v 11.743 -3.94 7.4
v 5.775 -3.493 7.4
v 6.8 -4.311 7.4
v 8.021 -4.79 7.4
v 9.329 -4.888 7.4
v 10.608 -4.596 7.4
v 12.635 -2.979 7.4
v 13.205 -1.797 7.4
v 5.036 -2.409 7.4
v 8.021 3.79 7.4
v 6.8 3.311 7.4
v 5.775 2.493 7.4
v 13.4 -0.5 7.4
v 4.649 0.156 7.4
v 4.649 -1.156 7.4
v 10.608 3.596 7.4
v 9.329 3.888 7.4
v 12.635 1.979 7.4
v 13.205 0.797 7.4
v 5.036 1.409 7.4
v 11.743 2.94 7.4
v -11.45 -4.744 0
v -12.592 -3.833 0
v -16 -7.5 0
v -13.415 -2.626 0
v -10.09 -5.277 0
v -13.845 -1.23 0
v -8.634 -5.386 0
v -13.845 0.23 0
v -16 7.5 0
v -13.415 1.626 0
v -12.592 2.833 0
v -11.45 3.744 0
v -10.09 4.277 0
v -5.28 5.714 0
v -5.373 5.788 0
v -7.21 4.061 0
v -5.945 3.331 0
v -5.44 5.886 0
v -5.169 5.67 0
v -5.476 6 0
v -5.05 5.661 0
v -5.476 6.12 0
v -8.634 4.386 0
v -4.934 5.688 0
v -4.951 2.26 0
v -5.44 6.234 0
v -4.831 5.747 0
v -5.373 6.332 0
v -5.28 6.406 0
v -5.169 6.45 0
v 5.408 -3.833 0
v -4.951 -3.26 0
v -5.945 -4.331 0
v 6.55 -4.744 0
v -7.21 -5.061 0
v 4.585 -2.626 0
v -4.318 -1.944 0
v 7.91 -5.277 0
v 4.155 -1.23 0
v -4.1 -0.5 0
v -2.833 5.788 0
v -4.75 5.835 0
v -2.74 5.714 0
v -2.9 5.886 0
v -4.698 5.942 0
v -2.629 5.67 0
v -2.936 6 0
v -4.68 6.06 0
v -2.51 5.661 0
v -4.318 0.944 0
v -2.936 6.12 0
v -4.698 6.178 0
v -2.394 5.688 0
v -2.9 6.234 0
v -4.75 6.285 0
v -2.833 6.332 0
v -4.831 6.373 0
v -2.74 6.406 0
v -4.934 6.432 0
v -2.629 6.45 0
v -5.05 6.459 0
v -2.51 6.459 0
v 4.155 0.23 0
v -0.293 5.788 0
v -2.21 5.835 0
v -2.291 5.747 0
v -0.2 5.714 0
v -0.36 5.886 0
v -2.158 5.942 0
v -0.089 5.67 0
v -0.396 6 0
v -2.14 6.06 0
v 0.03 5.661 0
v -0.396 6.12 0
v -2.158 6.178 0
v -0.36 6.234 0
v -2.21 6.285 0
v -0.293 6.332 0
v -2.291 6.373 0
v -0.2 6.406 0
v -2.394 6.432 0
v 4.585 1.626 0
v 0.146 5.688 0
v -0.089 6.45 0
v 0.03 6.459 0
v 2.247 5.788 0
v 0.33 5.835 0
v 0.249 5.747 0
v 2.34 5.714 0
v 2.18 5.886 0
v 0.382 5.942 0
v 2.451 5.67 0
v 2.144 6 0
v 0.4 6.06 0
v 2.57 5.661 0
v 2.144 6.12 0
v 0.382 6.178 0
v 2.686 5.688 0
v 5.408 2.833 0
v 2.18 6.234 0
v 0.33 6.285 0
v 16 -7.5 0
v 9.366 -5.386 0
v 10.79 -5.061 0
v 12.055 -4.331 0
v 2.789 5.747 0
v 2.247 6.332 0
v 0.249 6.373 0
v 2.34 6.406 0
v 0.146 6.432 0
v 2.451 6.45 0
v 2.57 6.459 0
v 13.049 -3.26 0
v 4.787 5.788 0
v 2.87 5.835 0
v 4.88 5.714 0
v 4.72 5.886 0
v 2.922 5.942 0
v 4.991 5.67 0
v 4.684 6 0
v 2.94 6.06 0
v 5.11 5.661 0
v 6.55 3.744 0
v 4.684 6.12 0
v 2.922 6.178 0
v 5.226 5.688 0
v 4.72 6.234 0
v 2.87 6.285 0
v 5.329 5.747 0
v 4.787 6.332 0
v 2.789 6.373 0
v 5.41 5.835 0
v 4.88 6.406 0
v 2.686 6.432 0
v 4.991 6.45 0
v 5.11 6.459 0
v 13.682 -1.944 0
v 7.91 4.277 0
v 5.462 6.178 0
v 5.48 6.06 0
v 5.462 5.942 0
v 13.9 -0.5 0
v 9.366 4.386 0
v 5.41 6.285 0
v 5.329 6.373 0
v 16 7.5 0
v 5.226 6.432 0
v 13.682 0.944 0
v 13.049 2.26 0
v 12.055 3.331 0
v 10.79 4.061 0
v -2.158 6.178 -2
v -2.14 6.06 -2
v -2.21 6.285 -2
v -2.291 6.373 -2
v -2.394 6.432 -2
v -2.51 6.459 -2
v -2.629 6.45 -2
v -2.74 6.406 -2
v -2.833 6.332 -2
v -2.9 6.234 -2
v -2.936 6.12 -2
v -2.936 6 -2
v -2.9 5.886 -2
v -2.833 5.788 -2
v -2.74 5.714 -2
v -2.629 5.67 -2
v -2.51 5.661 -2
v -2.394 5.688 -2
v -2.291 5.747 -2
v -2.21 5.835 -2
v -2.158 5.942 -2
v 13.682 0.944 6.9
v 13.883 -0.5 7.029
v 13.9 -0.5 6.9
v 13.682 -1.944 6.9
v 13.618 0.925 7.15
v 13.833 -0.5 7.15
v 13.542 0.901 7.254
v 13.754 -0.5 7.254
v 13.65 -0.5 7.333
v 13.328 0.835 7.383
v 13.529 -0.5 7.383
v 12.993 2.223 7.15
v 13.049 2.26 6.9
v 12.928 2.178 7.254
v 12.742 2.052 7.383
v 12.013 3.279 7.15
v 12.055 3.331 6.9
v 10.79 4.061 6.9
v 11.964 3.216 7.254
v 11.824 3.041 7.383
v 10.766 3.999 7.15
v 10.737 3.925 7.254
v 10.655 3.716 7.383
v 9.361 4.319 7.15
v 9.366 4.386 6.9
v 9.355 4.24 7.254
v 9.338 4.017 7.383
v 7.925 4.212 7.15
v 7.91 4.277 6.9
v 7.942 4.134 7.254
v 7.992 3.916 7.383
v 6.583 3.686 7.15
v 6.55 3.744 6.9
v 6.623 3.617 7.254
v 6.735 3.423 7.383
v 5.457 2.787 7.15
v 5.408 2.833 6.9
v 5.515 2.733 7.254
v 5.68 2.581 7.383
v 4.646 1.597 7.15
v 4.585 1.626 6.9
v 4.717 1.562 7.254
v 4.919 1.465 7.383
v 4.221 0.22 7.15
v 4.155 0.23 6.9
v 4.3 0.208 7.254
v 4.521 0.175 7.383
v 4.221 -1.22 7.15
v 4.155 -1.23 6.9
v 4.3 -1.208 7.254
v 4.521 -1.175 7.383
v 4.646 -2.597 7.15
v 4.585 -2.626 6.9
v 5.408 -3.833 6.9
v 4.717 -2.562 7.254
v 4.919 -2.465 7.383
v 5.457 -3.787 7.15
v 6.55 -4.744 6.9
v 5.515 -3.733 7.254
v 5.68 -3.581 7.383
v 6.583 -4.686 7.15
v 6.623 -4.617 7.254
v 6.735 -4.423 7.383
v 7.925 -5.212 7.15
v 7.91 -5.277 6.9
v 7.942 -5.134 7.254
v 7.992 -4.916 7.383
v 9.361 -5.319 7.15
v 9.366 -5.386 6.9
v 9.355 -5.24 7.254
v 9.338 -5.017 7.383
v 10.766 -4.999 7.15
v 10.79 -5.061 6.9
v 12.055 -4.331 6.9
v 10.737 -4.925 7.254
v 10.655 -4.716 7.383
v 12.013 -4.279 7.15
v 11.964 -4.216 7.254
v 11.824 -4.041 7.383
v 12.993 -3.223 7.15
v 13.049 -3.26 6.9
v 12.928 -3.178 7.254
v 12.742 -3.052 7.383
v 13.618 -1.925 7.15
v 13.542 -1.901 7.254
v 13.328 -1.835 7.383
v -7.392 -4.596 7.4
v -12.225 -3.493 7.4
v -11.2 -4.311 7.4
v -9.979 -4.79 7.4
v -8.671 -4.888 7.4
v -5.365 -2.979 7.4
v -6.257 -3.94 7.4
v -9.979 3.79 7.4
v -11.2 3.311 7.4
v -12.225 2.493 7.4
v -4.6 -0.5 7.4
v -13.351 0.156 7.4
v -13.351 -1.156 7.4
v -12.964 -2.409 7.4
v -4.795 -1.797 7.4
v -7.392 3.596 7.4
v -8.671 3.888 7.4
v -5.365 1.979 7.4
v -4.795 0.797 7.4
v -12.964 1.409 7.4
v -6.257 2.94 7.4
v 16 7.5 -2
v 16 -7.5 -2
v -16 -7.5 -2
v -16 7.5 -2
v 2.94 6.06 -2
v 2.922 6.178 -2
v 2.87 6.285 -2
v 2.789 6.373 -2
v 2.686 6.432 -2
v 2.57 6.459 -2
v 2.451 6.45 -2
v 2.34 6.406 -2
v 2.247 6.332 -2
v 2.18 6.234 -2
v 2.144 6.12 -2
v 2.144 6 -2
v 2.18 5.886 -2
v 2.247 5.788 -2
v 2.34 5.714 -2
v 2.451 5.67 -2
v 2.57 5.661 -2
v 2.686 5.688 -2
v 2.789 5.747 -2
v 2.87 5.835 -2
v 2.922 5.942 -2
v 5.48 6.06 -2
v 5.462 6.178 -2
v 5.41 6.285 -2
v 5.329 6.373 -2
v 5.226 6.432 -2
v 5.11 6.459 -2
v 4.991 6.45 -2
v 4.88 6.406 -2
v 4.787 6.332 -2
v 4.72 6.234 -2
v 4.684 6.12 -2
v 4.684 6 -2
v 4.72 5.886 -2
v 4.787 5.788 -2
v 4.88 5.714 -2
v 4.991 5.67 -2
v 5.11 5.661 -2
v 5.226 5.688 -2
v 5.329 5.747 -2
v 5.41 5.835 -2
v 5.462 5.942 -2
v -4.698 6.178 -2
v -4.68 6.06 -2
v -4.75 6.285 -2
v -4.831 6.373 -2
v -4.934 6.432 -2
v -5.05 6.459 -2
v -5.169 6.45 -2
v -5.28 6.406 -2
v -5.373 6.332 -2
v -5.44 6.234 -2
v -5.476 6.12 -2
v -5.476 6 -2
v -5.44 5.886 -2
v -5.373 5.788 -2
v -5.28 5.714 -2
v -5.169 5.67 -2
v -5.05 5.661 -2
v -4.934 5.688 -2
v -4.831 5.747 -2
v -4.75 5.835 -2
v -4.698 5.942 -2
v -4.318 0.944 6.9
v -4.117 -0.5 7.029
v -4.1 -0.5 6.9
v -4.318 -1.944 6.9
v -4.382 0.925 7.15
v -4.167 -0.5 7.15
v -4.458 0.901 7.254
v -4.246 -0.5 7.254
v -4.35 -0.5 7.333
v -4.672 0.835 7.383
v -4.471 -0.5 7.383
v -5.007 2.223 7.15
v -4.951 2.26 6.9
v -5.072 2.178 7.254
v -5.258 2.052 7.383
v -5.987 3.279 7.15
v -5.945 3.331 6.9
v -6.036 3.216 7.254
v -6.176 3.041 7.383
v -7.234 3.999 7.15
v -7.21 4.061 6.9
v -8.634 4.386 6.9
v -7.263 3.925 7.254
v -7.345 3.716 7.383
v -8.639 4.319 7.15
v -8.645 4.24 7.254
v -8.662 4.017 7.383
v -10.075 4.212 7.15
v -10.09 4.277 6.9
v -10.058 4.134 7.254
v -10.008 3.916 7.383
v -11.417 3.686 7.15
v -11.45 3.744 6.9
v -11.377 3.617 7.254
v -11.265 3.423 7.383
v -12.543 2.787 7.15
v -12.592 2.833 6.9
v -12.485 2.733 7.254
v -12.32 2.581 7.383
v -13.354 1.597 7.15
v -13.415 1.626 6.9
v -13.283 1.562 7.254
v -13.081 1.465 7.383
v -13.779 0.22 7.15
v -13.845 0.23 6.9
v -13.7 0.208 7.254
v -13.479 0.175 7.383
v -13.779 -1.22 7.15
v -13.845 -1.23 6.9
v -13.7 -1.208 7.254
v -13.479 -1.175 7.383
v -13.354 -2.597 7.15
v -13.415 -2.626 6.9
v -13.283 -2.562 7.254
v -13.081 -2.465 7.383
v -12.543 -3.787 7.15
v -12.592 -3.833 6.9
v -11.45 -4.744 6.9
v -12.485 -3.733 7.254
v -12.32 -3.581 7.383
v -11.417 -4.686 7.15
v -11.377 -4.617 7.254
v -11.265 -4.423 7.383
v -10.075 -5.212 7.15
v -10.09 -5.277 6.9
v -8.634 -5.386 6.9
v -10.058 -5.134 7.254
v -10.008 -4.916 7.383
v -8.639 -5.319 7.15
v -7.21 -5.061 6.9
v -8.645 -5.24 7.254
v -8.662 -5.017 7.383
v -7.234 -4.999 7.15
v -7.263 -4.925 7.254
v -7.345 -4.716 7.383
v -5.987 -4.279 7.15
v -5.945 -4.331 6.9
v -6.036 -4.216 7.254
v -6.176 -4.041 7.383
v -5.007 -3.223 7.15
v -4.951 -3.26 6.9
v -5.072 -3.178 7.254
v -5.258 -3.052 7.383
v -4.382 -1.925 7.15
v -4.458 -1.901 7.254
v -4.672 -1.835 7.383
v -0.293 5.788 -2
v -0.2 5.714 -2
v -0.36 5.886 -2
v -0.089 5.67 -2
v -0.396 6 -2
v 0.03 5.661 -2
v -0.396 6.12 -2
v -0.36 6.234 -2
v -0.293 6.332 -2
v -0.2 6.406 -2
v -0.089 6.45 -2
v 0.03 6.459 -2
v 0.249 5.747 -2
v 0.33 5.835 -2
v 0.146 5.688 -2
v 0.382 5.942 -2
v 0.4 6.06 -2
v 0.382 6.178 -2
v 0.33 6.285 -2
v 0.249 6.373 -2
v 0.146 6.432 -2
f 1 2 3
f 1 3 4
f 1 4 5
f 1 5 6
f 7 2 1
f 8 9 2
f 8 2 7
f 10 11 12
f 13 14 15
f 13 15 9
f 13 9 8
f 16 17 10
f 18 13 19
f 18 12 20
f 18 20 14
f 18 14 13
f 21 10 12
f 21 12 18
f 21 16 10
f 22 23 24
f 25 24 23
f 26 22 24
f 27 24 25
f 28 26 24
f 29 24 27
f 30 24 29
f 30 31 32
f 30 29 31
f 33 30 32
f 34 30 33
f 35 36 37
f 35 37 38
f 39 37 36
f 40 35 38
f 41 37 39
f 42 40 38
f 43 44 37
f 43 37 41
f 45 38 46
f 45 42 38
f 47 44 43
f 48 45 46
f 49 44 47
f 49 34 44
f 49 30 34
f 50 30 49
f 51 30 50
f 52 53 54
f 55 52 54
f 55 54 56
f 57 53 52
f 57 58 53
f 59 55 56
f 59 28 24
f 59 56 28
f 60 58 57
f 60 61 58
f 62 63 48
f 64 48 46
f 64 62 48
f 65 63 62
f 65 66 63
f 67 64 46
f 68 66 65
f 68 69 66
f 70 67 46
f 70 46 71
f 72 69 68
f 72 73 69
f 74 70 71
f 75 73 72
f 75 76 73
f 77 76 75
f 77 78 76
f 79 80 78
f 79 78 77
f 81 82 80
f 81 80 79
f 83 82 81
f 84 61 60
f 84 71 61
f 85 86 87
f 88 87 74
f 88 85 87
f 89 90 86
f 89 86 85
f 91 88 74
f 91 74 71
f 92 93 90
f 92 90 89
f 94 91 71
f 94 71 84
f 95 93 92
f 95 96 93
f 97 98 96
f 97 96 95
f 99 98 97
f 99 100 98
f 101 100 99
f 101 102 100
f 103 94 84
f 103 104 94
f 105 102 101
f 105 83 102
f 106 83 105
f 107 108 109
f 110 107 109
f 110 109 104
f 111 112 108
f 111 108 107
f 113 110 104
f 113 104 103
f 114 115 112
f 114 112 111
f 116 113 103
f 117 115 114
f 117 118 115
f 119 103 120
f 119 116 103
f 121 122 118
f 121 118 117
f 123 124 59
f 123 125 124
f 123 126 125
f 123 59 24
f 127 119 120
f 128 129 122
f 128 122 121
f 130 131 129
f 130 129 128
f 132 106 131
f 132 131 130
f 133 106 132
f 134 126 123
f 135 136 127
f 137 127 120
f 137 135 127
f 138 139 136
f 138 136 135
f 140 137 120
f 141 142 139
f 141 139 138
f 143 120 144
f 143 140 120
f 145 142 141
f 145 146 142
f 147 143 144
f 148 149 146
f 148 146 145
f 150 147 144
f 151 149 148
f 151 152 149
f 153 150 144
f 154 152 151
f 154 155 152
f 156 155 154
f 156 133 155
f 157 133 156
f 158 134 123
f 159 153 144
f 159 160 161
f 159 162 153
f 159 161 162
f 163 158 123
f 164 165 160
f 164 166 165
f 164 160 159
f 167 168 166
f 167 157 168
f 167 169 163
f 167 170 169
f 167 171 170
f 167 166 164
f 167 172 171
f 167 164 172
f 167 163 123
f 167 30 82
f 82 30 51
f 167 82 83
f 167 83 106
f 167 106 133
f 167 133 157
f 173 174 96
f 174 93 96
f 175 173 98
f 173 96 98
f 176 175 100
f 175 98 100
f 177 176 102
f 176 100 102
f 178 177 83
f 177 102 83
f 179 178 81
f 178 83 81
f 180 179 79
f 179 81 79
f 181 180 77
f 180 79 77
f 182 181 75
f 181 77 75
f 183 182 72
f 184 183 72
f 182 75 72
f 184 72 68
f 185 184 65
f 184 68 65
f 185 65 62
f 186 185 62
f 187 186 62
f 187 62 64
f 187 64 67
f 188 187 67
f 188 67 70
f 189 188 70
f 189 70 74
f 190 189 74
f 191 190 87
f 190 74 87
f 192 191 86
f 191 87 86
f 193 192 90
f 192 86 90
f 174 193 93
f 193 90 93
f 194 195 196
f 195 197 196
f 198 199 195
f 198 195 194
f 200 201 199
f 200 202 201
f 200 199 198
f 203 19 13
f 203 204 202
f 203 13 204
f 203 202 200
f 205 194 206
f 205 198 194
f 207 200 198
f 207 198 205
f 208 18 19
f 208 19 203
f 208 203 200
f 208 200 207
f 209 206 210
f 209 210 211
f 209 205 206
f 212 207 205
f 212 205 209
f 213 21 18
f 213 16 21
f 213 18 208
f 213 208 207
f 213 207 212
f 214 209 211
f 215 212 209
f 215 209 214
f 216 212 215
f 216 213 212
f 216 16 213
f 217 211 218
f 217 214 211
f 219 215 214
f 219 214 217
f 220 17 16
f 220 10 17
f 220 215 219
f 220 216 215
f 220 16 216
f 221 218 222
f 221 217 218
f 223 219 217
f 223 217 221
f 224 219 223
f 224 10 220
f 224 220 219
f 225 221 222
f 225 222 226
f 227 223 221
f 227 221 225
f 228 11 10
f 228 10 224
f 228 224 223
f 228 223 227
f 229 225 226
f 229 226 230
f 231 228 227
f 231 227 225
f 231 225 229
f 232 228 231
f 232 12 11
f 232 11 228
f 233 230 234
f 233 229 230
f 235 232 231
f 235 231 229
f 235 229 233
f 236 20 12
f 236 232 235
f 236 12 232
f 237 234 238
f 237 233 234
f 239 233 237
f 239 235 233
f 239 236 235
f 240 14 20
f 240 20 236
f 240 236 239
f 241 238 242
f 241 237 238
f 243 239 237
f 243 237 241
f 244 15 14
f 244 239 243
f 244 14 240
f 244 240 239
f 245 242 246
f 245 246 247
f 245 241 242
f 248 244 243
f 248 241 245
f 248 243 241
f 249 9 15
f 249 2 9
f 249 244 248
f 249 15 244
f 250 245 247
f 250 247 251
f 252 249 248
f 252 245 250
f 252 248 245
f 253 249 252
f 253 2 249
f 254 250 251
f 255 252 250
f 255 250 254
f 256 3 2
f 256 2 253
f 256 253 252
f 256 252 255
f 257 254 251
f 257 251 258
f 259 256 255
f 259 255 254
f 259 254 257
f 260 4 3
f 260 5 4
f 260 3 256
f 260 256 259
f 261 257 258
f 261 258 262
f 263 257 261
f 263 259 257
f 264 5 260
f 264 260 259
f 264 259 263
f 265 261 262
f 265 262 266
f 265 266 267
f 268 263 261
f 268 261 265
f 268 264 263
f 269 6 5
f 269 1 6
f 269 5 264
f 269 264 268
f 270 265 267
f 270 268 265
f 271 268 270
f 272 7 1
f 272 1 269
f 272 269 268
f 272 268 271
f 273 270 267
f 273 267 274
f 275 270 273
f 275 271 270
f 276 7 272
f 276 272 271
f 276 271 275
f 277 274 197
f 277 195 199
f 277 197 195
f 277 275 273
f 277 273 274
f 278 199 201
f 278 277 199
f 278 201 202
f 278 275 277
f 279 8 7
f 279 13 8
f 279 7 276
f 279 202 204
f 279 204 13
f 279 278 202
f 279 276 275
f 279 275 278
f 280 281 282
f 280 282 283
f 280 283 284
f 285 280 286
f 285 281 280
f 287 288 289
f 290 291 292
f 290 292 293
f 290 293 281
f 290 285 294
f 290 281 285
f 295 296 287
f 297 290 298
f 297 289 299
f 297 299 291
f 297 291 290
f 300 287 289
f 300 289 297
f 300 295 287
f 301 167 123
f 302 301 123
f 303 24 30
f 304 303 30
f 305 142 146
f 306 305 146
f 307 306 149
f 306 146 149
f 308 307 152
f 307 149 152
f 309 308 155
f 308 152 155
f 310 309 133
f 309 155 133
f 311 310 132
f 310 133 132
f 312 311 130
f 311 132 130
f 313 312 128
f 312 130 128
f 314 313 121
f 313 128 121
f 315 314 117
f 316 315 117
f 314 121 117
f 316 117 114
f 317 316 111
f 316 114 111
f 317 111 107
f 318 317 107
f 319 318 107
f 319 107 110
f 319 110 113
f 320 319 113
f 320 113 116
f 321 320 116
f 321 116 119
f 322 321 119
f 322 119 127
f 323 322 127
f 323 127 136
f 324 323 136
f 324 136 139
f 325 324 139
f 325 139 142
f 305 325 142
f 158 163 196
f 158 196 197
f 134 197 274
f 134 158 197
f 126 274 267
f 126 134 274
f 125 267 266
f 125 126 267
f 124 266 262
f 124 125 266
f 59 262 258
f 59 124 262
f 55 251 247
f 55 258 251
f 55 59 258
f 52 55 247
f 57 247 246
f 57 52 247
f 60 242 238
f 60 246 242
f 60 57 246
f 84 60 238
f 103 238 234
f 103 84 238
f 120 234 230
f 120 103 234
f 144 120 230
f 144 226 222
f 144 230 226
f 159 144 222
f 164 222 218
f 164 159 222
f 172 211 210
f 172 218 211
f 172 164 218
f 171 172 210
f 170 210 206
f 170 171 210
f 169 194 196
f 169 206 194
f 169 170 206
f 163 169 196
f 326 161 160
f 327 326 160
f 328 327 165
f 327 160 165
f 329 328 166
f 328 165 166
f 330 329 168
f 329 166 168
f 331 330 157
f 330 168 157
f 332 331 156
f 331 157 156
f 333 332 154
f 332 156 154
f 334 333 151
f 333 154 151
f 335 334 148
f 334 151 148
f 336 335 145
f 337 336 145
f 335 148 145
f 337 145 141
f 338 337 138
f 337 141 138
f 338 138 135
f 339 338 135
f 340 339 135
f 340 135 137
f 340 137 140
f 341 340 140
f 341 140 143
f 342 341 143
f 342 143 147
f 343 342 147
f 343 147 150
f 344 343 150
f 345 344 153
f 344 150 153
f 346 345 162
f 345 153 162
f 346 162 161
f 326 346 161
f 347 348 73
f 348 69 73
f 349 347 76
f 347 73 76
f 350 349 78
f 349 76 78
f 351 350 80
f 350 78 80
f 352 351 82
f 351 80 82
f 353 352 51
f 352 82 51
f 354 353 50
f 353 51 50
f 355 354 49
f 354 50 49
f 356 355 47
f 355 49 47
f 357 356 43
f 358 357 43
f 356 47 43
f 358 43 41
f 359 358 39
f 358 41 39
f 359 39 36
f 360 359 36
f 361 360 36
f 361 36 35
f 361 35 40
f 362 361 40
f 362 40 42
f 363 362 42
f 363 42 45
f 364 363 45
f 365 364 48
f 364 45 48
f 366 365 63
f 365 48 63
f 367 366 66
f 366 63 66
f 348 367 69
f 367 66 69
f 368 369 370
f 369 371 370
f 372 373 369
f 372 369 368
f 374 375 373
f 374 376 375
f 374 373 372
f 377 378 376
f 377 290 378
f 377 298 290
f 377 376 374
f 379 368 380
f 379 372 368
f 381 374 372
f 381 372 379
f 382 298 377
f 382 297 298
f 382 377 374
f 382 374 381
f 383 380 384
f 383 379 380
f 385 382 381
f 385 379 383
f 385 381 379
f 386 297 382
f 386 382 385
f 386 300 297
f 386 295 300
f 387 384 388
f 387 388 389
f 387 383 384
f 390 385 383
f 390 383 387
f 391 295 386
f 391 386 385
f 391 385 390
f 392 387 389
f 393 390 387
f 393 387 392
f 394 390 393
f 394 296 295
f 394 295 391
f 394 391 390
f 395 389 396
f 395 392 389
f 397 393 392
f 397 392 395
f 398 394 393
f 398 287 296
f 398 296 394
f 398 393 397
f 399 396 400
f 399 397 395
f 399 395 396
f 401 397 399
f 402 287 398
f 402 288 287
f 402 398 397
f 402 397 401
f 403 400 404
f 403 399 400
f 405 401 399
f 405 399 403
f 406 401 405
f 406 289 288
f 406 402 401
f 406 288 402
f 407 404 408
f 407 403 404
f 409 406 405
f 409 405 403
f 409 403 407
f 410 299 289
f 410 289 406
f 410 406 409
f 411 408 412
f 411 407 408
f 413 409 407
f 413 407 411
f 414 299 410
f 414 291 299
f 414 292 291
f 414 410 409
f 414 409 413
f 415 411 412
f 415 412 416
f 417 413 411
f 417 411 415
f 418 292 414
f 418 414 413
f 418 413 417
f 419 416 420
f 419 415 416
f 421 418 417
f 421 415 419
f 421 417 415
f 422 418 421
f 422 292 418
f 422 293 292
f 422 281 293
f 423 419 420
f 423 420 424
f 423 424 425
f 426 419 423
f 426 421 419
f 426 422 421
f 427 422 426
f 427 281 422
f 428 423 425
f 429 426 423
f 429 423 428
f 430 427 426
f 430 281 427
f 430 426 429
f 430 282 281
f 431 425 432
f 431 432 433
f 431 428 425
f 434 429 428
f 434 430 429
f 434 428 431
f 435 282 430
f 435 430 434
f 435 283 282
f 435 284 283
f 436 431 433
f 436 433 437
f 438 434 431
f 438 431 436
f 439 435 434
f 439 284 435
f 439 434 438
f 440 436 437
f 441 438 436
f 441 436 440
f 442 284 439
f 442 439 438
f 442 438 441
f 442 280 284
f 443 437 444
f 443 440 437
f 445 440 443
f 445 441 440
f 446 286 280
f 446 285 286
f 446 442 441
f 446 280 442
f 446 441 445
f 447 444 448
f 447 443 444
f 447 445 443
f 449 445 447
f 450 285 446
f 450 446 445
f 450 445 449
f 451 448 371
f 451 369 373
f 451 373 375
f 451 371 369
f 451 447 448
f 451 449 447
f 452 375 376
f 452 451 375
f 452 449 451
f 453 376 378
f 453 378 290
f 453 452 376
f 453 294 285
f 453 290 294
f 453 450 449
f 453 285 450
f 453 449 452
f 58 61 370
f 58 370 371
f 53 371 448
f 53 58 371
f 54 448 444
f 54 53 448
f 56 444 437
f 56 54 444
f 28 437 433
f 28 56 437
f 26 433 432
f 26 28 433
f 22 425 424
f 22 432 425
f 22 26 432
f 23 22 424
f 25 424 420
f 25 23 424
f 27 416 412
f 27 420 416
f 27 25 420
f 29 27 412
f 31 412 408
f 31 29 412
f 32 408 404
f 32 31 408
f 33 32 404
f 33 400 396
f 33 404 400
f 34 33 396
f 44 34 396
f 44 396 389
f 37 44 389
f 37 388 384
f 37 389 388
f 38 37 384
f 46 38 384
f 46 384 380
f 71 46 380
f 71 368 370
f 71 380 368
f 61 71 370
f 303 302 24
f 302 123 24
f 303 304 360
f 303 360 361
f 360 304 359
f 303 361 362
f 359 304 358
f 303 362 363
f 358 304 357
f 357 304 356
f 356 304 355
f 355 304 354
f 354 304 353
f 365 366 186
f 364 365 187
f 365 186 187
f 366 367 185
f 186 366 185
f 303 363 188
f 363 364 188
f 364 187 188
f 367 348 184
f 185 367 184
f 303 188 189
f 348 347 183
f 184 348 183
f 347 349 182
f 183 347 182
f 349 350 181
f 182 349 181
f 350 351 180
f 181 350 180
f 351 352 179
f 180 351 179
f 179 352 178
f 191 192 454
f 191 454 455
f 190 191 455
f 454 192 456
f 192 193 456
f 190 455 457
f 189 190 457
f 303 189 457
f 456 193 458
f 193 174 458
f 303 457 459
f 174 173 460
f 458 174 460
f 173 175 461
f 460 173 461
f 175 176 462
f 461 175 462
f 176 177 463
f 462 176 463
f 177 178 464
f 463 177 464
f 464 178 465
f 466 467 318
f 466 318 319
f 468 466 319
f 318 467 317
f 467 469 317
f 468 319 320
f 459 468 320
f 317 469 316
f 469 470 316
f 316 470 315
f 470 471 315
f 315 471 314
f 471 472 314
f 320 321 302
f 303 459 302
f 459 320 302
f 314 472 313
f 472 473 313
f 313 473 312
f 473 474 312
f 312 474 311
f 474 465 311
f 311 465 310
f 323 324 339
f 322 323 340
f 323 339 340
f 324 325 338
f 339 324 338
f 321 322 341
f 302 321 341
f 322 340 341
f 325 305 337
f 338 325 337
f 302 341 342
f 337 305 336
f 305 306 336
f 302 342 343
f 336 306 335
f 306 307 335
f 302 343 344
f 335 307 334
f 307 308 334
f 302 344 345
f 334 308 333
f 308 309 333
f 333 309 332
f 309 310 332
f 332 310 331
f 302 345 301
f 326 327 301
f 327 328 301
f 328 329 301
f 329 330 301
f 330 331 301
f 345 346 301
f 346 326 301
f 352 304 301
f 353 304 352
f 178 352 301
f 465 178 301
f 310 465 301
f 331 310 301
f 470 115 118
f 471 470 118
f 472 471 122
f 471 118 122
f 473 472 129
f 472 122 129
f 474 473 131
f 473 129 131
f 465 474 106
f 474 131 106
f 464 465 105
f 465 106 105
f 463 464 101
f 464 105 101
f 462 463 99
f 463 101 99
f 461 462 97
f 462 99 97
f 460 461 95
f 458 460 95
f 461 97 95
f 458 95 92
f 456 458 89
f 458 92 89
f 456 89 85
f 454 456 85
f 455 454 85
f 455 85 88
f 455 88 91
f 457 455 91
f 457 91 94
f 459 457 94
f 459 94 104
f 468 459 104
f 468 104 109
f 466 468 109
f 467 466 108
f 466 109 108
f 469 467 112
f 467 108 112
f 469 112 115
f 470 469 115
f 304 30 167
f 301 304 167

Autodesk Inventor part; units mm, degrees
ref_plane "YZ Plane" through (0, 0, 0) normal (1, 0, 0) x (0, 1, 0)
ref_plane "XZ Plane" through (0, 0, 0) normal (0, 1, 0) x (-1, 0, 0)
ref_plane "XY Plane" through (0, 0, 0) normal (0, 0, 1) x (1, 0, 0)
sketch "Sketch1" plane through (0, 0, 0) normal (0, 0, 1) x (1, 0, 0)
  line L0 (-16, 7.5) -> (16, 7.5)
  line L1 (16, 7.5) -> (16, -7.5)
  line L2 (16, -7.5) -> (-16, -7.5)
  line L3 (-16, -7.5) -> (-16, 7.5)
  line L4 (-16, 0) -> (-16, 7.5)
  line L5 (-16, 7.5) -> (0, 7.5)
  point P0 (0, 0)
  dimension "d0" = 32
  dimension "d1" = 15
extrude "Extrusion1" add sketch "Sketch1" against normal blind 2
sketch "Sketch2" plane through (0, 0, 0) normal (0, 0, 1) x (1, 0, 0)
  line L0 (-16, 7.5) -> (16, 7.5) projected
  line L1 (-16, -7.5) -> (-16, 7.5) projected
  line L2 (16, -7.5) -> (-16, -7.5) projected
  line L3 (16, 7.5) -> (16, -7.5) projected
  circle A0 centre (-9, -0.5) radius 4.9
  circle A1 centre (9, -0.5) radius 4.9
  circle A2 centre (0, 6.06) radius 0.4
  circle A3 centre (-2.54, 6.06) radius 0.4
  circle A4 centre (-5.08, 6.06) radius 0.4
  line L4 (0, 0) -> (0, 3) construction
  line L5 (0, 3) -> (0, 0) construction
  line L6 (16, 7.5) -> (-16, 7.5)
  circle A5 centre (2.54, 6.06) radius 0.4
  circle A6 centre (5.08, 6.06) radius 0.4
  point P0 (8.9861, 0.5)
  dimension "d8" = 9.8
  dimension "d11" = 32
  dimension "d12" = 15
  dimension "d16" = 8
  dimension "d17" = 9.8
  dimension "d19" = 9
  dimension "d20" = 9
  dimension "d24" = 0.8
  dimension "d25" = 1.44
  dimension "d26" = 0.8
  dimension "d27" = 2.54
  dimension "d28" = 0.8
  dimension "d29" = 2.54
extrude "Extrusion3" add sketch "Sketch2" along normal blind 7.4 contours A0 | A1
fillet "Fillet2" radius 0.5 2 edges at (-13.9, -0.5, 7.4) (4.1, -0.5, 7.4)
extrude "Extrusion4" cut sketch "Sketch2" against normal up to next contours A2 | A3 | A4 | A5 | A6
properties part number "srf10"
